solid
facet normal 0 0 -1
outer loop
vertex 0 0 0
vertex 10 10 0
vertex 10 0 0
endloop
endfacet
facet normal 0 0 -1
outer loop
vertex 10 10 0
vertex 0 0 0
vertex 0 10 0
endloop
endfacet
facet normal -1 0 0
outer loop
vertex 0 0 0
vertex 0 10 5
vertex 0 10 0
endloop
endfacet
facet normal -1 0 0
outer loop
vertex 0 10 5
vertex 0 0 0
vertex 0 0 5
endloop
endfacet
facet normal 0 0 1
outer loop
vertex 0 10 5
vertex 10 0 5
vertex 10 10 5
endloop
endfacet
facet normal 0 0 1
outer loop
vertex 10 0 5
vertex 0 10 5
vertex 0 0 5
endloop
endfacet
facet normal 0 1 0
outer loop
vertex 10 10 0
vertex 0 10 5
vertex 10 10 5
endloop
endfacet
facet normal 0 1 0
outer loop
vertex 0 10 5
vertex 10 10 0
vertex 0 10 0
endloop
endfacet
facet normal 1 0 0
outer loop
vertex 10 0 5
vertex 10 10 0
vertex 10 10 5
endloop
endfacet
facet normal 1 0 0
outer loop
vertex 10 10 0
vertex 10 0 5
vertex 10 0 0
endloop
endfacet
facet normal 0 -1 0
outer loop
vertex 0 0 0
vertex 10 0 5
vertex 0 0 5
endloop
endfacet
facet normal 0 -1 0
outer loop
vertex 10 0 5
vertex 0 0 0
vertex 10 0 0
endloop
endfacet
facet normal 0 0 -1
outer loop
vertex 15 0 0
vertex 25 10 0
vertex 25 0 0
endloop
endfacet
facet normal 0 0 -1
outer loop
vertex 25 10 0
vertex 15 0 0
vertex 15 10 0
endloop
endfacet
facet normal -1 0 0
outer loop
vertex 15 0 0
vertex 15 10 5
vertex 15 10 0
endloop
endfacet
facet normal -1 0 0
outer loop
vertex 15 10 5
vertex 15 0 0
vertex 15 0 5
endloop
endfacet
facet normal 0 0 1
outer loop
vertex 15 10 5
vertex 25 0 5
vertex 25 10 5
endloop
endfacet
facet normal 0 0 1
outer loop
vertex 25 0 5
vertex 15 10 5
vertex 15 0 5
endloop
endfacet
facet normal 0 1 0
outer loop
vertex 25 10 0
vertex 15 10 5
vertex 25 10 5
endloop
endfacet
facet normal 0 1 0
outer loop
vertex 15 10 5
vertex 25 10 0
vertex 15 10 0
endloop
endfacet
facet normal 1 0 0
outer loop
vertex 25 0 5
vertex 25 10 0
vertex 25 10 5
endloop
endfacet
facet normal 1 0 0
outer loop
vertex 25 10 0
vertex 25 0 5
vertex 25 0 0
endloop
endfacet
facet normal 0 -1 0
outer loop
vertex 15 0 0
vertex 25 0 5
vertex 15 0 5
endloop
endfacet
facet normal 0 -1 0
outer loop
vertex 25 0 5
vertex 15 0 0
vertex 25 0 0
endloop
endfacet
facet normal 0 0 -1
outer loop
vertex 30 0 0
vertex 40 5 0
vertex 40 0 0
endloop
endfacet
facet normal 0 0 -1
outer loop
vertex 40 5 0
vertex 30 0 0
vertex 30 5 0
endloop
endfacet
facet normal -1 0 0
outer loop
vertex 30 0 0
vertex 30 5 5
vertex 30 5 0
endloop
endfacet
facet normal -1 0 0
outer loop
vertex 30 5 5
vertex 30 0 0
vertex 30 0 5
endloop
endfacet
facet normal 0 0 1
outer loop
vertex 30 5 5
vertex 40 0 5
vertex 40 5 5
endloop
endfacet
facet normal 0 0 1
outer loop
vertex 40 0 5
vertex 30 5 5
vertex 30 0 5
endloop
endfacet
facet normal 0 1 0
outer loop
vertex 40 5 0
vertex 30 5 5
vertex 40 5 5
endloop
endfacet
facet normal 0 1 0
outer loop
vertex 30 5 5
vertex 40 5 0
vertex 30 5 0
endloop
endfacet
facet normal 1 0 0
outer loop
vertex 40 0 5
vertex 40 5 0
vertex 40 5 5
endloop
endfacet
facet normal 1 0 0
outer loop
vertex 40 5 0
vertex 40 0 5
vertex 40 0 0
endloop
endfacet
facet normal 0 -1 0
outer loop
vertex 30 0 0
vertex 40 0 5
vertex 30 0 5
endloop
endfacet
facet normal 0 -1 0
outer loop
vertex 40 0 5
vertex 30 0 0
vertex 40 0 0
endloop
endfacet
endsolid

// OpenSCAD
linear_extrude(5) color("red") square(10);
translate([15,0,0]) color("blue") linear_extrude(5) square(10);
translate([30,0,0]) linear_extrude(5) { color("red") square(5); color("blue") translate([5,0]) square(5); }
